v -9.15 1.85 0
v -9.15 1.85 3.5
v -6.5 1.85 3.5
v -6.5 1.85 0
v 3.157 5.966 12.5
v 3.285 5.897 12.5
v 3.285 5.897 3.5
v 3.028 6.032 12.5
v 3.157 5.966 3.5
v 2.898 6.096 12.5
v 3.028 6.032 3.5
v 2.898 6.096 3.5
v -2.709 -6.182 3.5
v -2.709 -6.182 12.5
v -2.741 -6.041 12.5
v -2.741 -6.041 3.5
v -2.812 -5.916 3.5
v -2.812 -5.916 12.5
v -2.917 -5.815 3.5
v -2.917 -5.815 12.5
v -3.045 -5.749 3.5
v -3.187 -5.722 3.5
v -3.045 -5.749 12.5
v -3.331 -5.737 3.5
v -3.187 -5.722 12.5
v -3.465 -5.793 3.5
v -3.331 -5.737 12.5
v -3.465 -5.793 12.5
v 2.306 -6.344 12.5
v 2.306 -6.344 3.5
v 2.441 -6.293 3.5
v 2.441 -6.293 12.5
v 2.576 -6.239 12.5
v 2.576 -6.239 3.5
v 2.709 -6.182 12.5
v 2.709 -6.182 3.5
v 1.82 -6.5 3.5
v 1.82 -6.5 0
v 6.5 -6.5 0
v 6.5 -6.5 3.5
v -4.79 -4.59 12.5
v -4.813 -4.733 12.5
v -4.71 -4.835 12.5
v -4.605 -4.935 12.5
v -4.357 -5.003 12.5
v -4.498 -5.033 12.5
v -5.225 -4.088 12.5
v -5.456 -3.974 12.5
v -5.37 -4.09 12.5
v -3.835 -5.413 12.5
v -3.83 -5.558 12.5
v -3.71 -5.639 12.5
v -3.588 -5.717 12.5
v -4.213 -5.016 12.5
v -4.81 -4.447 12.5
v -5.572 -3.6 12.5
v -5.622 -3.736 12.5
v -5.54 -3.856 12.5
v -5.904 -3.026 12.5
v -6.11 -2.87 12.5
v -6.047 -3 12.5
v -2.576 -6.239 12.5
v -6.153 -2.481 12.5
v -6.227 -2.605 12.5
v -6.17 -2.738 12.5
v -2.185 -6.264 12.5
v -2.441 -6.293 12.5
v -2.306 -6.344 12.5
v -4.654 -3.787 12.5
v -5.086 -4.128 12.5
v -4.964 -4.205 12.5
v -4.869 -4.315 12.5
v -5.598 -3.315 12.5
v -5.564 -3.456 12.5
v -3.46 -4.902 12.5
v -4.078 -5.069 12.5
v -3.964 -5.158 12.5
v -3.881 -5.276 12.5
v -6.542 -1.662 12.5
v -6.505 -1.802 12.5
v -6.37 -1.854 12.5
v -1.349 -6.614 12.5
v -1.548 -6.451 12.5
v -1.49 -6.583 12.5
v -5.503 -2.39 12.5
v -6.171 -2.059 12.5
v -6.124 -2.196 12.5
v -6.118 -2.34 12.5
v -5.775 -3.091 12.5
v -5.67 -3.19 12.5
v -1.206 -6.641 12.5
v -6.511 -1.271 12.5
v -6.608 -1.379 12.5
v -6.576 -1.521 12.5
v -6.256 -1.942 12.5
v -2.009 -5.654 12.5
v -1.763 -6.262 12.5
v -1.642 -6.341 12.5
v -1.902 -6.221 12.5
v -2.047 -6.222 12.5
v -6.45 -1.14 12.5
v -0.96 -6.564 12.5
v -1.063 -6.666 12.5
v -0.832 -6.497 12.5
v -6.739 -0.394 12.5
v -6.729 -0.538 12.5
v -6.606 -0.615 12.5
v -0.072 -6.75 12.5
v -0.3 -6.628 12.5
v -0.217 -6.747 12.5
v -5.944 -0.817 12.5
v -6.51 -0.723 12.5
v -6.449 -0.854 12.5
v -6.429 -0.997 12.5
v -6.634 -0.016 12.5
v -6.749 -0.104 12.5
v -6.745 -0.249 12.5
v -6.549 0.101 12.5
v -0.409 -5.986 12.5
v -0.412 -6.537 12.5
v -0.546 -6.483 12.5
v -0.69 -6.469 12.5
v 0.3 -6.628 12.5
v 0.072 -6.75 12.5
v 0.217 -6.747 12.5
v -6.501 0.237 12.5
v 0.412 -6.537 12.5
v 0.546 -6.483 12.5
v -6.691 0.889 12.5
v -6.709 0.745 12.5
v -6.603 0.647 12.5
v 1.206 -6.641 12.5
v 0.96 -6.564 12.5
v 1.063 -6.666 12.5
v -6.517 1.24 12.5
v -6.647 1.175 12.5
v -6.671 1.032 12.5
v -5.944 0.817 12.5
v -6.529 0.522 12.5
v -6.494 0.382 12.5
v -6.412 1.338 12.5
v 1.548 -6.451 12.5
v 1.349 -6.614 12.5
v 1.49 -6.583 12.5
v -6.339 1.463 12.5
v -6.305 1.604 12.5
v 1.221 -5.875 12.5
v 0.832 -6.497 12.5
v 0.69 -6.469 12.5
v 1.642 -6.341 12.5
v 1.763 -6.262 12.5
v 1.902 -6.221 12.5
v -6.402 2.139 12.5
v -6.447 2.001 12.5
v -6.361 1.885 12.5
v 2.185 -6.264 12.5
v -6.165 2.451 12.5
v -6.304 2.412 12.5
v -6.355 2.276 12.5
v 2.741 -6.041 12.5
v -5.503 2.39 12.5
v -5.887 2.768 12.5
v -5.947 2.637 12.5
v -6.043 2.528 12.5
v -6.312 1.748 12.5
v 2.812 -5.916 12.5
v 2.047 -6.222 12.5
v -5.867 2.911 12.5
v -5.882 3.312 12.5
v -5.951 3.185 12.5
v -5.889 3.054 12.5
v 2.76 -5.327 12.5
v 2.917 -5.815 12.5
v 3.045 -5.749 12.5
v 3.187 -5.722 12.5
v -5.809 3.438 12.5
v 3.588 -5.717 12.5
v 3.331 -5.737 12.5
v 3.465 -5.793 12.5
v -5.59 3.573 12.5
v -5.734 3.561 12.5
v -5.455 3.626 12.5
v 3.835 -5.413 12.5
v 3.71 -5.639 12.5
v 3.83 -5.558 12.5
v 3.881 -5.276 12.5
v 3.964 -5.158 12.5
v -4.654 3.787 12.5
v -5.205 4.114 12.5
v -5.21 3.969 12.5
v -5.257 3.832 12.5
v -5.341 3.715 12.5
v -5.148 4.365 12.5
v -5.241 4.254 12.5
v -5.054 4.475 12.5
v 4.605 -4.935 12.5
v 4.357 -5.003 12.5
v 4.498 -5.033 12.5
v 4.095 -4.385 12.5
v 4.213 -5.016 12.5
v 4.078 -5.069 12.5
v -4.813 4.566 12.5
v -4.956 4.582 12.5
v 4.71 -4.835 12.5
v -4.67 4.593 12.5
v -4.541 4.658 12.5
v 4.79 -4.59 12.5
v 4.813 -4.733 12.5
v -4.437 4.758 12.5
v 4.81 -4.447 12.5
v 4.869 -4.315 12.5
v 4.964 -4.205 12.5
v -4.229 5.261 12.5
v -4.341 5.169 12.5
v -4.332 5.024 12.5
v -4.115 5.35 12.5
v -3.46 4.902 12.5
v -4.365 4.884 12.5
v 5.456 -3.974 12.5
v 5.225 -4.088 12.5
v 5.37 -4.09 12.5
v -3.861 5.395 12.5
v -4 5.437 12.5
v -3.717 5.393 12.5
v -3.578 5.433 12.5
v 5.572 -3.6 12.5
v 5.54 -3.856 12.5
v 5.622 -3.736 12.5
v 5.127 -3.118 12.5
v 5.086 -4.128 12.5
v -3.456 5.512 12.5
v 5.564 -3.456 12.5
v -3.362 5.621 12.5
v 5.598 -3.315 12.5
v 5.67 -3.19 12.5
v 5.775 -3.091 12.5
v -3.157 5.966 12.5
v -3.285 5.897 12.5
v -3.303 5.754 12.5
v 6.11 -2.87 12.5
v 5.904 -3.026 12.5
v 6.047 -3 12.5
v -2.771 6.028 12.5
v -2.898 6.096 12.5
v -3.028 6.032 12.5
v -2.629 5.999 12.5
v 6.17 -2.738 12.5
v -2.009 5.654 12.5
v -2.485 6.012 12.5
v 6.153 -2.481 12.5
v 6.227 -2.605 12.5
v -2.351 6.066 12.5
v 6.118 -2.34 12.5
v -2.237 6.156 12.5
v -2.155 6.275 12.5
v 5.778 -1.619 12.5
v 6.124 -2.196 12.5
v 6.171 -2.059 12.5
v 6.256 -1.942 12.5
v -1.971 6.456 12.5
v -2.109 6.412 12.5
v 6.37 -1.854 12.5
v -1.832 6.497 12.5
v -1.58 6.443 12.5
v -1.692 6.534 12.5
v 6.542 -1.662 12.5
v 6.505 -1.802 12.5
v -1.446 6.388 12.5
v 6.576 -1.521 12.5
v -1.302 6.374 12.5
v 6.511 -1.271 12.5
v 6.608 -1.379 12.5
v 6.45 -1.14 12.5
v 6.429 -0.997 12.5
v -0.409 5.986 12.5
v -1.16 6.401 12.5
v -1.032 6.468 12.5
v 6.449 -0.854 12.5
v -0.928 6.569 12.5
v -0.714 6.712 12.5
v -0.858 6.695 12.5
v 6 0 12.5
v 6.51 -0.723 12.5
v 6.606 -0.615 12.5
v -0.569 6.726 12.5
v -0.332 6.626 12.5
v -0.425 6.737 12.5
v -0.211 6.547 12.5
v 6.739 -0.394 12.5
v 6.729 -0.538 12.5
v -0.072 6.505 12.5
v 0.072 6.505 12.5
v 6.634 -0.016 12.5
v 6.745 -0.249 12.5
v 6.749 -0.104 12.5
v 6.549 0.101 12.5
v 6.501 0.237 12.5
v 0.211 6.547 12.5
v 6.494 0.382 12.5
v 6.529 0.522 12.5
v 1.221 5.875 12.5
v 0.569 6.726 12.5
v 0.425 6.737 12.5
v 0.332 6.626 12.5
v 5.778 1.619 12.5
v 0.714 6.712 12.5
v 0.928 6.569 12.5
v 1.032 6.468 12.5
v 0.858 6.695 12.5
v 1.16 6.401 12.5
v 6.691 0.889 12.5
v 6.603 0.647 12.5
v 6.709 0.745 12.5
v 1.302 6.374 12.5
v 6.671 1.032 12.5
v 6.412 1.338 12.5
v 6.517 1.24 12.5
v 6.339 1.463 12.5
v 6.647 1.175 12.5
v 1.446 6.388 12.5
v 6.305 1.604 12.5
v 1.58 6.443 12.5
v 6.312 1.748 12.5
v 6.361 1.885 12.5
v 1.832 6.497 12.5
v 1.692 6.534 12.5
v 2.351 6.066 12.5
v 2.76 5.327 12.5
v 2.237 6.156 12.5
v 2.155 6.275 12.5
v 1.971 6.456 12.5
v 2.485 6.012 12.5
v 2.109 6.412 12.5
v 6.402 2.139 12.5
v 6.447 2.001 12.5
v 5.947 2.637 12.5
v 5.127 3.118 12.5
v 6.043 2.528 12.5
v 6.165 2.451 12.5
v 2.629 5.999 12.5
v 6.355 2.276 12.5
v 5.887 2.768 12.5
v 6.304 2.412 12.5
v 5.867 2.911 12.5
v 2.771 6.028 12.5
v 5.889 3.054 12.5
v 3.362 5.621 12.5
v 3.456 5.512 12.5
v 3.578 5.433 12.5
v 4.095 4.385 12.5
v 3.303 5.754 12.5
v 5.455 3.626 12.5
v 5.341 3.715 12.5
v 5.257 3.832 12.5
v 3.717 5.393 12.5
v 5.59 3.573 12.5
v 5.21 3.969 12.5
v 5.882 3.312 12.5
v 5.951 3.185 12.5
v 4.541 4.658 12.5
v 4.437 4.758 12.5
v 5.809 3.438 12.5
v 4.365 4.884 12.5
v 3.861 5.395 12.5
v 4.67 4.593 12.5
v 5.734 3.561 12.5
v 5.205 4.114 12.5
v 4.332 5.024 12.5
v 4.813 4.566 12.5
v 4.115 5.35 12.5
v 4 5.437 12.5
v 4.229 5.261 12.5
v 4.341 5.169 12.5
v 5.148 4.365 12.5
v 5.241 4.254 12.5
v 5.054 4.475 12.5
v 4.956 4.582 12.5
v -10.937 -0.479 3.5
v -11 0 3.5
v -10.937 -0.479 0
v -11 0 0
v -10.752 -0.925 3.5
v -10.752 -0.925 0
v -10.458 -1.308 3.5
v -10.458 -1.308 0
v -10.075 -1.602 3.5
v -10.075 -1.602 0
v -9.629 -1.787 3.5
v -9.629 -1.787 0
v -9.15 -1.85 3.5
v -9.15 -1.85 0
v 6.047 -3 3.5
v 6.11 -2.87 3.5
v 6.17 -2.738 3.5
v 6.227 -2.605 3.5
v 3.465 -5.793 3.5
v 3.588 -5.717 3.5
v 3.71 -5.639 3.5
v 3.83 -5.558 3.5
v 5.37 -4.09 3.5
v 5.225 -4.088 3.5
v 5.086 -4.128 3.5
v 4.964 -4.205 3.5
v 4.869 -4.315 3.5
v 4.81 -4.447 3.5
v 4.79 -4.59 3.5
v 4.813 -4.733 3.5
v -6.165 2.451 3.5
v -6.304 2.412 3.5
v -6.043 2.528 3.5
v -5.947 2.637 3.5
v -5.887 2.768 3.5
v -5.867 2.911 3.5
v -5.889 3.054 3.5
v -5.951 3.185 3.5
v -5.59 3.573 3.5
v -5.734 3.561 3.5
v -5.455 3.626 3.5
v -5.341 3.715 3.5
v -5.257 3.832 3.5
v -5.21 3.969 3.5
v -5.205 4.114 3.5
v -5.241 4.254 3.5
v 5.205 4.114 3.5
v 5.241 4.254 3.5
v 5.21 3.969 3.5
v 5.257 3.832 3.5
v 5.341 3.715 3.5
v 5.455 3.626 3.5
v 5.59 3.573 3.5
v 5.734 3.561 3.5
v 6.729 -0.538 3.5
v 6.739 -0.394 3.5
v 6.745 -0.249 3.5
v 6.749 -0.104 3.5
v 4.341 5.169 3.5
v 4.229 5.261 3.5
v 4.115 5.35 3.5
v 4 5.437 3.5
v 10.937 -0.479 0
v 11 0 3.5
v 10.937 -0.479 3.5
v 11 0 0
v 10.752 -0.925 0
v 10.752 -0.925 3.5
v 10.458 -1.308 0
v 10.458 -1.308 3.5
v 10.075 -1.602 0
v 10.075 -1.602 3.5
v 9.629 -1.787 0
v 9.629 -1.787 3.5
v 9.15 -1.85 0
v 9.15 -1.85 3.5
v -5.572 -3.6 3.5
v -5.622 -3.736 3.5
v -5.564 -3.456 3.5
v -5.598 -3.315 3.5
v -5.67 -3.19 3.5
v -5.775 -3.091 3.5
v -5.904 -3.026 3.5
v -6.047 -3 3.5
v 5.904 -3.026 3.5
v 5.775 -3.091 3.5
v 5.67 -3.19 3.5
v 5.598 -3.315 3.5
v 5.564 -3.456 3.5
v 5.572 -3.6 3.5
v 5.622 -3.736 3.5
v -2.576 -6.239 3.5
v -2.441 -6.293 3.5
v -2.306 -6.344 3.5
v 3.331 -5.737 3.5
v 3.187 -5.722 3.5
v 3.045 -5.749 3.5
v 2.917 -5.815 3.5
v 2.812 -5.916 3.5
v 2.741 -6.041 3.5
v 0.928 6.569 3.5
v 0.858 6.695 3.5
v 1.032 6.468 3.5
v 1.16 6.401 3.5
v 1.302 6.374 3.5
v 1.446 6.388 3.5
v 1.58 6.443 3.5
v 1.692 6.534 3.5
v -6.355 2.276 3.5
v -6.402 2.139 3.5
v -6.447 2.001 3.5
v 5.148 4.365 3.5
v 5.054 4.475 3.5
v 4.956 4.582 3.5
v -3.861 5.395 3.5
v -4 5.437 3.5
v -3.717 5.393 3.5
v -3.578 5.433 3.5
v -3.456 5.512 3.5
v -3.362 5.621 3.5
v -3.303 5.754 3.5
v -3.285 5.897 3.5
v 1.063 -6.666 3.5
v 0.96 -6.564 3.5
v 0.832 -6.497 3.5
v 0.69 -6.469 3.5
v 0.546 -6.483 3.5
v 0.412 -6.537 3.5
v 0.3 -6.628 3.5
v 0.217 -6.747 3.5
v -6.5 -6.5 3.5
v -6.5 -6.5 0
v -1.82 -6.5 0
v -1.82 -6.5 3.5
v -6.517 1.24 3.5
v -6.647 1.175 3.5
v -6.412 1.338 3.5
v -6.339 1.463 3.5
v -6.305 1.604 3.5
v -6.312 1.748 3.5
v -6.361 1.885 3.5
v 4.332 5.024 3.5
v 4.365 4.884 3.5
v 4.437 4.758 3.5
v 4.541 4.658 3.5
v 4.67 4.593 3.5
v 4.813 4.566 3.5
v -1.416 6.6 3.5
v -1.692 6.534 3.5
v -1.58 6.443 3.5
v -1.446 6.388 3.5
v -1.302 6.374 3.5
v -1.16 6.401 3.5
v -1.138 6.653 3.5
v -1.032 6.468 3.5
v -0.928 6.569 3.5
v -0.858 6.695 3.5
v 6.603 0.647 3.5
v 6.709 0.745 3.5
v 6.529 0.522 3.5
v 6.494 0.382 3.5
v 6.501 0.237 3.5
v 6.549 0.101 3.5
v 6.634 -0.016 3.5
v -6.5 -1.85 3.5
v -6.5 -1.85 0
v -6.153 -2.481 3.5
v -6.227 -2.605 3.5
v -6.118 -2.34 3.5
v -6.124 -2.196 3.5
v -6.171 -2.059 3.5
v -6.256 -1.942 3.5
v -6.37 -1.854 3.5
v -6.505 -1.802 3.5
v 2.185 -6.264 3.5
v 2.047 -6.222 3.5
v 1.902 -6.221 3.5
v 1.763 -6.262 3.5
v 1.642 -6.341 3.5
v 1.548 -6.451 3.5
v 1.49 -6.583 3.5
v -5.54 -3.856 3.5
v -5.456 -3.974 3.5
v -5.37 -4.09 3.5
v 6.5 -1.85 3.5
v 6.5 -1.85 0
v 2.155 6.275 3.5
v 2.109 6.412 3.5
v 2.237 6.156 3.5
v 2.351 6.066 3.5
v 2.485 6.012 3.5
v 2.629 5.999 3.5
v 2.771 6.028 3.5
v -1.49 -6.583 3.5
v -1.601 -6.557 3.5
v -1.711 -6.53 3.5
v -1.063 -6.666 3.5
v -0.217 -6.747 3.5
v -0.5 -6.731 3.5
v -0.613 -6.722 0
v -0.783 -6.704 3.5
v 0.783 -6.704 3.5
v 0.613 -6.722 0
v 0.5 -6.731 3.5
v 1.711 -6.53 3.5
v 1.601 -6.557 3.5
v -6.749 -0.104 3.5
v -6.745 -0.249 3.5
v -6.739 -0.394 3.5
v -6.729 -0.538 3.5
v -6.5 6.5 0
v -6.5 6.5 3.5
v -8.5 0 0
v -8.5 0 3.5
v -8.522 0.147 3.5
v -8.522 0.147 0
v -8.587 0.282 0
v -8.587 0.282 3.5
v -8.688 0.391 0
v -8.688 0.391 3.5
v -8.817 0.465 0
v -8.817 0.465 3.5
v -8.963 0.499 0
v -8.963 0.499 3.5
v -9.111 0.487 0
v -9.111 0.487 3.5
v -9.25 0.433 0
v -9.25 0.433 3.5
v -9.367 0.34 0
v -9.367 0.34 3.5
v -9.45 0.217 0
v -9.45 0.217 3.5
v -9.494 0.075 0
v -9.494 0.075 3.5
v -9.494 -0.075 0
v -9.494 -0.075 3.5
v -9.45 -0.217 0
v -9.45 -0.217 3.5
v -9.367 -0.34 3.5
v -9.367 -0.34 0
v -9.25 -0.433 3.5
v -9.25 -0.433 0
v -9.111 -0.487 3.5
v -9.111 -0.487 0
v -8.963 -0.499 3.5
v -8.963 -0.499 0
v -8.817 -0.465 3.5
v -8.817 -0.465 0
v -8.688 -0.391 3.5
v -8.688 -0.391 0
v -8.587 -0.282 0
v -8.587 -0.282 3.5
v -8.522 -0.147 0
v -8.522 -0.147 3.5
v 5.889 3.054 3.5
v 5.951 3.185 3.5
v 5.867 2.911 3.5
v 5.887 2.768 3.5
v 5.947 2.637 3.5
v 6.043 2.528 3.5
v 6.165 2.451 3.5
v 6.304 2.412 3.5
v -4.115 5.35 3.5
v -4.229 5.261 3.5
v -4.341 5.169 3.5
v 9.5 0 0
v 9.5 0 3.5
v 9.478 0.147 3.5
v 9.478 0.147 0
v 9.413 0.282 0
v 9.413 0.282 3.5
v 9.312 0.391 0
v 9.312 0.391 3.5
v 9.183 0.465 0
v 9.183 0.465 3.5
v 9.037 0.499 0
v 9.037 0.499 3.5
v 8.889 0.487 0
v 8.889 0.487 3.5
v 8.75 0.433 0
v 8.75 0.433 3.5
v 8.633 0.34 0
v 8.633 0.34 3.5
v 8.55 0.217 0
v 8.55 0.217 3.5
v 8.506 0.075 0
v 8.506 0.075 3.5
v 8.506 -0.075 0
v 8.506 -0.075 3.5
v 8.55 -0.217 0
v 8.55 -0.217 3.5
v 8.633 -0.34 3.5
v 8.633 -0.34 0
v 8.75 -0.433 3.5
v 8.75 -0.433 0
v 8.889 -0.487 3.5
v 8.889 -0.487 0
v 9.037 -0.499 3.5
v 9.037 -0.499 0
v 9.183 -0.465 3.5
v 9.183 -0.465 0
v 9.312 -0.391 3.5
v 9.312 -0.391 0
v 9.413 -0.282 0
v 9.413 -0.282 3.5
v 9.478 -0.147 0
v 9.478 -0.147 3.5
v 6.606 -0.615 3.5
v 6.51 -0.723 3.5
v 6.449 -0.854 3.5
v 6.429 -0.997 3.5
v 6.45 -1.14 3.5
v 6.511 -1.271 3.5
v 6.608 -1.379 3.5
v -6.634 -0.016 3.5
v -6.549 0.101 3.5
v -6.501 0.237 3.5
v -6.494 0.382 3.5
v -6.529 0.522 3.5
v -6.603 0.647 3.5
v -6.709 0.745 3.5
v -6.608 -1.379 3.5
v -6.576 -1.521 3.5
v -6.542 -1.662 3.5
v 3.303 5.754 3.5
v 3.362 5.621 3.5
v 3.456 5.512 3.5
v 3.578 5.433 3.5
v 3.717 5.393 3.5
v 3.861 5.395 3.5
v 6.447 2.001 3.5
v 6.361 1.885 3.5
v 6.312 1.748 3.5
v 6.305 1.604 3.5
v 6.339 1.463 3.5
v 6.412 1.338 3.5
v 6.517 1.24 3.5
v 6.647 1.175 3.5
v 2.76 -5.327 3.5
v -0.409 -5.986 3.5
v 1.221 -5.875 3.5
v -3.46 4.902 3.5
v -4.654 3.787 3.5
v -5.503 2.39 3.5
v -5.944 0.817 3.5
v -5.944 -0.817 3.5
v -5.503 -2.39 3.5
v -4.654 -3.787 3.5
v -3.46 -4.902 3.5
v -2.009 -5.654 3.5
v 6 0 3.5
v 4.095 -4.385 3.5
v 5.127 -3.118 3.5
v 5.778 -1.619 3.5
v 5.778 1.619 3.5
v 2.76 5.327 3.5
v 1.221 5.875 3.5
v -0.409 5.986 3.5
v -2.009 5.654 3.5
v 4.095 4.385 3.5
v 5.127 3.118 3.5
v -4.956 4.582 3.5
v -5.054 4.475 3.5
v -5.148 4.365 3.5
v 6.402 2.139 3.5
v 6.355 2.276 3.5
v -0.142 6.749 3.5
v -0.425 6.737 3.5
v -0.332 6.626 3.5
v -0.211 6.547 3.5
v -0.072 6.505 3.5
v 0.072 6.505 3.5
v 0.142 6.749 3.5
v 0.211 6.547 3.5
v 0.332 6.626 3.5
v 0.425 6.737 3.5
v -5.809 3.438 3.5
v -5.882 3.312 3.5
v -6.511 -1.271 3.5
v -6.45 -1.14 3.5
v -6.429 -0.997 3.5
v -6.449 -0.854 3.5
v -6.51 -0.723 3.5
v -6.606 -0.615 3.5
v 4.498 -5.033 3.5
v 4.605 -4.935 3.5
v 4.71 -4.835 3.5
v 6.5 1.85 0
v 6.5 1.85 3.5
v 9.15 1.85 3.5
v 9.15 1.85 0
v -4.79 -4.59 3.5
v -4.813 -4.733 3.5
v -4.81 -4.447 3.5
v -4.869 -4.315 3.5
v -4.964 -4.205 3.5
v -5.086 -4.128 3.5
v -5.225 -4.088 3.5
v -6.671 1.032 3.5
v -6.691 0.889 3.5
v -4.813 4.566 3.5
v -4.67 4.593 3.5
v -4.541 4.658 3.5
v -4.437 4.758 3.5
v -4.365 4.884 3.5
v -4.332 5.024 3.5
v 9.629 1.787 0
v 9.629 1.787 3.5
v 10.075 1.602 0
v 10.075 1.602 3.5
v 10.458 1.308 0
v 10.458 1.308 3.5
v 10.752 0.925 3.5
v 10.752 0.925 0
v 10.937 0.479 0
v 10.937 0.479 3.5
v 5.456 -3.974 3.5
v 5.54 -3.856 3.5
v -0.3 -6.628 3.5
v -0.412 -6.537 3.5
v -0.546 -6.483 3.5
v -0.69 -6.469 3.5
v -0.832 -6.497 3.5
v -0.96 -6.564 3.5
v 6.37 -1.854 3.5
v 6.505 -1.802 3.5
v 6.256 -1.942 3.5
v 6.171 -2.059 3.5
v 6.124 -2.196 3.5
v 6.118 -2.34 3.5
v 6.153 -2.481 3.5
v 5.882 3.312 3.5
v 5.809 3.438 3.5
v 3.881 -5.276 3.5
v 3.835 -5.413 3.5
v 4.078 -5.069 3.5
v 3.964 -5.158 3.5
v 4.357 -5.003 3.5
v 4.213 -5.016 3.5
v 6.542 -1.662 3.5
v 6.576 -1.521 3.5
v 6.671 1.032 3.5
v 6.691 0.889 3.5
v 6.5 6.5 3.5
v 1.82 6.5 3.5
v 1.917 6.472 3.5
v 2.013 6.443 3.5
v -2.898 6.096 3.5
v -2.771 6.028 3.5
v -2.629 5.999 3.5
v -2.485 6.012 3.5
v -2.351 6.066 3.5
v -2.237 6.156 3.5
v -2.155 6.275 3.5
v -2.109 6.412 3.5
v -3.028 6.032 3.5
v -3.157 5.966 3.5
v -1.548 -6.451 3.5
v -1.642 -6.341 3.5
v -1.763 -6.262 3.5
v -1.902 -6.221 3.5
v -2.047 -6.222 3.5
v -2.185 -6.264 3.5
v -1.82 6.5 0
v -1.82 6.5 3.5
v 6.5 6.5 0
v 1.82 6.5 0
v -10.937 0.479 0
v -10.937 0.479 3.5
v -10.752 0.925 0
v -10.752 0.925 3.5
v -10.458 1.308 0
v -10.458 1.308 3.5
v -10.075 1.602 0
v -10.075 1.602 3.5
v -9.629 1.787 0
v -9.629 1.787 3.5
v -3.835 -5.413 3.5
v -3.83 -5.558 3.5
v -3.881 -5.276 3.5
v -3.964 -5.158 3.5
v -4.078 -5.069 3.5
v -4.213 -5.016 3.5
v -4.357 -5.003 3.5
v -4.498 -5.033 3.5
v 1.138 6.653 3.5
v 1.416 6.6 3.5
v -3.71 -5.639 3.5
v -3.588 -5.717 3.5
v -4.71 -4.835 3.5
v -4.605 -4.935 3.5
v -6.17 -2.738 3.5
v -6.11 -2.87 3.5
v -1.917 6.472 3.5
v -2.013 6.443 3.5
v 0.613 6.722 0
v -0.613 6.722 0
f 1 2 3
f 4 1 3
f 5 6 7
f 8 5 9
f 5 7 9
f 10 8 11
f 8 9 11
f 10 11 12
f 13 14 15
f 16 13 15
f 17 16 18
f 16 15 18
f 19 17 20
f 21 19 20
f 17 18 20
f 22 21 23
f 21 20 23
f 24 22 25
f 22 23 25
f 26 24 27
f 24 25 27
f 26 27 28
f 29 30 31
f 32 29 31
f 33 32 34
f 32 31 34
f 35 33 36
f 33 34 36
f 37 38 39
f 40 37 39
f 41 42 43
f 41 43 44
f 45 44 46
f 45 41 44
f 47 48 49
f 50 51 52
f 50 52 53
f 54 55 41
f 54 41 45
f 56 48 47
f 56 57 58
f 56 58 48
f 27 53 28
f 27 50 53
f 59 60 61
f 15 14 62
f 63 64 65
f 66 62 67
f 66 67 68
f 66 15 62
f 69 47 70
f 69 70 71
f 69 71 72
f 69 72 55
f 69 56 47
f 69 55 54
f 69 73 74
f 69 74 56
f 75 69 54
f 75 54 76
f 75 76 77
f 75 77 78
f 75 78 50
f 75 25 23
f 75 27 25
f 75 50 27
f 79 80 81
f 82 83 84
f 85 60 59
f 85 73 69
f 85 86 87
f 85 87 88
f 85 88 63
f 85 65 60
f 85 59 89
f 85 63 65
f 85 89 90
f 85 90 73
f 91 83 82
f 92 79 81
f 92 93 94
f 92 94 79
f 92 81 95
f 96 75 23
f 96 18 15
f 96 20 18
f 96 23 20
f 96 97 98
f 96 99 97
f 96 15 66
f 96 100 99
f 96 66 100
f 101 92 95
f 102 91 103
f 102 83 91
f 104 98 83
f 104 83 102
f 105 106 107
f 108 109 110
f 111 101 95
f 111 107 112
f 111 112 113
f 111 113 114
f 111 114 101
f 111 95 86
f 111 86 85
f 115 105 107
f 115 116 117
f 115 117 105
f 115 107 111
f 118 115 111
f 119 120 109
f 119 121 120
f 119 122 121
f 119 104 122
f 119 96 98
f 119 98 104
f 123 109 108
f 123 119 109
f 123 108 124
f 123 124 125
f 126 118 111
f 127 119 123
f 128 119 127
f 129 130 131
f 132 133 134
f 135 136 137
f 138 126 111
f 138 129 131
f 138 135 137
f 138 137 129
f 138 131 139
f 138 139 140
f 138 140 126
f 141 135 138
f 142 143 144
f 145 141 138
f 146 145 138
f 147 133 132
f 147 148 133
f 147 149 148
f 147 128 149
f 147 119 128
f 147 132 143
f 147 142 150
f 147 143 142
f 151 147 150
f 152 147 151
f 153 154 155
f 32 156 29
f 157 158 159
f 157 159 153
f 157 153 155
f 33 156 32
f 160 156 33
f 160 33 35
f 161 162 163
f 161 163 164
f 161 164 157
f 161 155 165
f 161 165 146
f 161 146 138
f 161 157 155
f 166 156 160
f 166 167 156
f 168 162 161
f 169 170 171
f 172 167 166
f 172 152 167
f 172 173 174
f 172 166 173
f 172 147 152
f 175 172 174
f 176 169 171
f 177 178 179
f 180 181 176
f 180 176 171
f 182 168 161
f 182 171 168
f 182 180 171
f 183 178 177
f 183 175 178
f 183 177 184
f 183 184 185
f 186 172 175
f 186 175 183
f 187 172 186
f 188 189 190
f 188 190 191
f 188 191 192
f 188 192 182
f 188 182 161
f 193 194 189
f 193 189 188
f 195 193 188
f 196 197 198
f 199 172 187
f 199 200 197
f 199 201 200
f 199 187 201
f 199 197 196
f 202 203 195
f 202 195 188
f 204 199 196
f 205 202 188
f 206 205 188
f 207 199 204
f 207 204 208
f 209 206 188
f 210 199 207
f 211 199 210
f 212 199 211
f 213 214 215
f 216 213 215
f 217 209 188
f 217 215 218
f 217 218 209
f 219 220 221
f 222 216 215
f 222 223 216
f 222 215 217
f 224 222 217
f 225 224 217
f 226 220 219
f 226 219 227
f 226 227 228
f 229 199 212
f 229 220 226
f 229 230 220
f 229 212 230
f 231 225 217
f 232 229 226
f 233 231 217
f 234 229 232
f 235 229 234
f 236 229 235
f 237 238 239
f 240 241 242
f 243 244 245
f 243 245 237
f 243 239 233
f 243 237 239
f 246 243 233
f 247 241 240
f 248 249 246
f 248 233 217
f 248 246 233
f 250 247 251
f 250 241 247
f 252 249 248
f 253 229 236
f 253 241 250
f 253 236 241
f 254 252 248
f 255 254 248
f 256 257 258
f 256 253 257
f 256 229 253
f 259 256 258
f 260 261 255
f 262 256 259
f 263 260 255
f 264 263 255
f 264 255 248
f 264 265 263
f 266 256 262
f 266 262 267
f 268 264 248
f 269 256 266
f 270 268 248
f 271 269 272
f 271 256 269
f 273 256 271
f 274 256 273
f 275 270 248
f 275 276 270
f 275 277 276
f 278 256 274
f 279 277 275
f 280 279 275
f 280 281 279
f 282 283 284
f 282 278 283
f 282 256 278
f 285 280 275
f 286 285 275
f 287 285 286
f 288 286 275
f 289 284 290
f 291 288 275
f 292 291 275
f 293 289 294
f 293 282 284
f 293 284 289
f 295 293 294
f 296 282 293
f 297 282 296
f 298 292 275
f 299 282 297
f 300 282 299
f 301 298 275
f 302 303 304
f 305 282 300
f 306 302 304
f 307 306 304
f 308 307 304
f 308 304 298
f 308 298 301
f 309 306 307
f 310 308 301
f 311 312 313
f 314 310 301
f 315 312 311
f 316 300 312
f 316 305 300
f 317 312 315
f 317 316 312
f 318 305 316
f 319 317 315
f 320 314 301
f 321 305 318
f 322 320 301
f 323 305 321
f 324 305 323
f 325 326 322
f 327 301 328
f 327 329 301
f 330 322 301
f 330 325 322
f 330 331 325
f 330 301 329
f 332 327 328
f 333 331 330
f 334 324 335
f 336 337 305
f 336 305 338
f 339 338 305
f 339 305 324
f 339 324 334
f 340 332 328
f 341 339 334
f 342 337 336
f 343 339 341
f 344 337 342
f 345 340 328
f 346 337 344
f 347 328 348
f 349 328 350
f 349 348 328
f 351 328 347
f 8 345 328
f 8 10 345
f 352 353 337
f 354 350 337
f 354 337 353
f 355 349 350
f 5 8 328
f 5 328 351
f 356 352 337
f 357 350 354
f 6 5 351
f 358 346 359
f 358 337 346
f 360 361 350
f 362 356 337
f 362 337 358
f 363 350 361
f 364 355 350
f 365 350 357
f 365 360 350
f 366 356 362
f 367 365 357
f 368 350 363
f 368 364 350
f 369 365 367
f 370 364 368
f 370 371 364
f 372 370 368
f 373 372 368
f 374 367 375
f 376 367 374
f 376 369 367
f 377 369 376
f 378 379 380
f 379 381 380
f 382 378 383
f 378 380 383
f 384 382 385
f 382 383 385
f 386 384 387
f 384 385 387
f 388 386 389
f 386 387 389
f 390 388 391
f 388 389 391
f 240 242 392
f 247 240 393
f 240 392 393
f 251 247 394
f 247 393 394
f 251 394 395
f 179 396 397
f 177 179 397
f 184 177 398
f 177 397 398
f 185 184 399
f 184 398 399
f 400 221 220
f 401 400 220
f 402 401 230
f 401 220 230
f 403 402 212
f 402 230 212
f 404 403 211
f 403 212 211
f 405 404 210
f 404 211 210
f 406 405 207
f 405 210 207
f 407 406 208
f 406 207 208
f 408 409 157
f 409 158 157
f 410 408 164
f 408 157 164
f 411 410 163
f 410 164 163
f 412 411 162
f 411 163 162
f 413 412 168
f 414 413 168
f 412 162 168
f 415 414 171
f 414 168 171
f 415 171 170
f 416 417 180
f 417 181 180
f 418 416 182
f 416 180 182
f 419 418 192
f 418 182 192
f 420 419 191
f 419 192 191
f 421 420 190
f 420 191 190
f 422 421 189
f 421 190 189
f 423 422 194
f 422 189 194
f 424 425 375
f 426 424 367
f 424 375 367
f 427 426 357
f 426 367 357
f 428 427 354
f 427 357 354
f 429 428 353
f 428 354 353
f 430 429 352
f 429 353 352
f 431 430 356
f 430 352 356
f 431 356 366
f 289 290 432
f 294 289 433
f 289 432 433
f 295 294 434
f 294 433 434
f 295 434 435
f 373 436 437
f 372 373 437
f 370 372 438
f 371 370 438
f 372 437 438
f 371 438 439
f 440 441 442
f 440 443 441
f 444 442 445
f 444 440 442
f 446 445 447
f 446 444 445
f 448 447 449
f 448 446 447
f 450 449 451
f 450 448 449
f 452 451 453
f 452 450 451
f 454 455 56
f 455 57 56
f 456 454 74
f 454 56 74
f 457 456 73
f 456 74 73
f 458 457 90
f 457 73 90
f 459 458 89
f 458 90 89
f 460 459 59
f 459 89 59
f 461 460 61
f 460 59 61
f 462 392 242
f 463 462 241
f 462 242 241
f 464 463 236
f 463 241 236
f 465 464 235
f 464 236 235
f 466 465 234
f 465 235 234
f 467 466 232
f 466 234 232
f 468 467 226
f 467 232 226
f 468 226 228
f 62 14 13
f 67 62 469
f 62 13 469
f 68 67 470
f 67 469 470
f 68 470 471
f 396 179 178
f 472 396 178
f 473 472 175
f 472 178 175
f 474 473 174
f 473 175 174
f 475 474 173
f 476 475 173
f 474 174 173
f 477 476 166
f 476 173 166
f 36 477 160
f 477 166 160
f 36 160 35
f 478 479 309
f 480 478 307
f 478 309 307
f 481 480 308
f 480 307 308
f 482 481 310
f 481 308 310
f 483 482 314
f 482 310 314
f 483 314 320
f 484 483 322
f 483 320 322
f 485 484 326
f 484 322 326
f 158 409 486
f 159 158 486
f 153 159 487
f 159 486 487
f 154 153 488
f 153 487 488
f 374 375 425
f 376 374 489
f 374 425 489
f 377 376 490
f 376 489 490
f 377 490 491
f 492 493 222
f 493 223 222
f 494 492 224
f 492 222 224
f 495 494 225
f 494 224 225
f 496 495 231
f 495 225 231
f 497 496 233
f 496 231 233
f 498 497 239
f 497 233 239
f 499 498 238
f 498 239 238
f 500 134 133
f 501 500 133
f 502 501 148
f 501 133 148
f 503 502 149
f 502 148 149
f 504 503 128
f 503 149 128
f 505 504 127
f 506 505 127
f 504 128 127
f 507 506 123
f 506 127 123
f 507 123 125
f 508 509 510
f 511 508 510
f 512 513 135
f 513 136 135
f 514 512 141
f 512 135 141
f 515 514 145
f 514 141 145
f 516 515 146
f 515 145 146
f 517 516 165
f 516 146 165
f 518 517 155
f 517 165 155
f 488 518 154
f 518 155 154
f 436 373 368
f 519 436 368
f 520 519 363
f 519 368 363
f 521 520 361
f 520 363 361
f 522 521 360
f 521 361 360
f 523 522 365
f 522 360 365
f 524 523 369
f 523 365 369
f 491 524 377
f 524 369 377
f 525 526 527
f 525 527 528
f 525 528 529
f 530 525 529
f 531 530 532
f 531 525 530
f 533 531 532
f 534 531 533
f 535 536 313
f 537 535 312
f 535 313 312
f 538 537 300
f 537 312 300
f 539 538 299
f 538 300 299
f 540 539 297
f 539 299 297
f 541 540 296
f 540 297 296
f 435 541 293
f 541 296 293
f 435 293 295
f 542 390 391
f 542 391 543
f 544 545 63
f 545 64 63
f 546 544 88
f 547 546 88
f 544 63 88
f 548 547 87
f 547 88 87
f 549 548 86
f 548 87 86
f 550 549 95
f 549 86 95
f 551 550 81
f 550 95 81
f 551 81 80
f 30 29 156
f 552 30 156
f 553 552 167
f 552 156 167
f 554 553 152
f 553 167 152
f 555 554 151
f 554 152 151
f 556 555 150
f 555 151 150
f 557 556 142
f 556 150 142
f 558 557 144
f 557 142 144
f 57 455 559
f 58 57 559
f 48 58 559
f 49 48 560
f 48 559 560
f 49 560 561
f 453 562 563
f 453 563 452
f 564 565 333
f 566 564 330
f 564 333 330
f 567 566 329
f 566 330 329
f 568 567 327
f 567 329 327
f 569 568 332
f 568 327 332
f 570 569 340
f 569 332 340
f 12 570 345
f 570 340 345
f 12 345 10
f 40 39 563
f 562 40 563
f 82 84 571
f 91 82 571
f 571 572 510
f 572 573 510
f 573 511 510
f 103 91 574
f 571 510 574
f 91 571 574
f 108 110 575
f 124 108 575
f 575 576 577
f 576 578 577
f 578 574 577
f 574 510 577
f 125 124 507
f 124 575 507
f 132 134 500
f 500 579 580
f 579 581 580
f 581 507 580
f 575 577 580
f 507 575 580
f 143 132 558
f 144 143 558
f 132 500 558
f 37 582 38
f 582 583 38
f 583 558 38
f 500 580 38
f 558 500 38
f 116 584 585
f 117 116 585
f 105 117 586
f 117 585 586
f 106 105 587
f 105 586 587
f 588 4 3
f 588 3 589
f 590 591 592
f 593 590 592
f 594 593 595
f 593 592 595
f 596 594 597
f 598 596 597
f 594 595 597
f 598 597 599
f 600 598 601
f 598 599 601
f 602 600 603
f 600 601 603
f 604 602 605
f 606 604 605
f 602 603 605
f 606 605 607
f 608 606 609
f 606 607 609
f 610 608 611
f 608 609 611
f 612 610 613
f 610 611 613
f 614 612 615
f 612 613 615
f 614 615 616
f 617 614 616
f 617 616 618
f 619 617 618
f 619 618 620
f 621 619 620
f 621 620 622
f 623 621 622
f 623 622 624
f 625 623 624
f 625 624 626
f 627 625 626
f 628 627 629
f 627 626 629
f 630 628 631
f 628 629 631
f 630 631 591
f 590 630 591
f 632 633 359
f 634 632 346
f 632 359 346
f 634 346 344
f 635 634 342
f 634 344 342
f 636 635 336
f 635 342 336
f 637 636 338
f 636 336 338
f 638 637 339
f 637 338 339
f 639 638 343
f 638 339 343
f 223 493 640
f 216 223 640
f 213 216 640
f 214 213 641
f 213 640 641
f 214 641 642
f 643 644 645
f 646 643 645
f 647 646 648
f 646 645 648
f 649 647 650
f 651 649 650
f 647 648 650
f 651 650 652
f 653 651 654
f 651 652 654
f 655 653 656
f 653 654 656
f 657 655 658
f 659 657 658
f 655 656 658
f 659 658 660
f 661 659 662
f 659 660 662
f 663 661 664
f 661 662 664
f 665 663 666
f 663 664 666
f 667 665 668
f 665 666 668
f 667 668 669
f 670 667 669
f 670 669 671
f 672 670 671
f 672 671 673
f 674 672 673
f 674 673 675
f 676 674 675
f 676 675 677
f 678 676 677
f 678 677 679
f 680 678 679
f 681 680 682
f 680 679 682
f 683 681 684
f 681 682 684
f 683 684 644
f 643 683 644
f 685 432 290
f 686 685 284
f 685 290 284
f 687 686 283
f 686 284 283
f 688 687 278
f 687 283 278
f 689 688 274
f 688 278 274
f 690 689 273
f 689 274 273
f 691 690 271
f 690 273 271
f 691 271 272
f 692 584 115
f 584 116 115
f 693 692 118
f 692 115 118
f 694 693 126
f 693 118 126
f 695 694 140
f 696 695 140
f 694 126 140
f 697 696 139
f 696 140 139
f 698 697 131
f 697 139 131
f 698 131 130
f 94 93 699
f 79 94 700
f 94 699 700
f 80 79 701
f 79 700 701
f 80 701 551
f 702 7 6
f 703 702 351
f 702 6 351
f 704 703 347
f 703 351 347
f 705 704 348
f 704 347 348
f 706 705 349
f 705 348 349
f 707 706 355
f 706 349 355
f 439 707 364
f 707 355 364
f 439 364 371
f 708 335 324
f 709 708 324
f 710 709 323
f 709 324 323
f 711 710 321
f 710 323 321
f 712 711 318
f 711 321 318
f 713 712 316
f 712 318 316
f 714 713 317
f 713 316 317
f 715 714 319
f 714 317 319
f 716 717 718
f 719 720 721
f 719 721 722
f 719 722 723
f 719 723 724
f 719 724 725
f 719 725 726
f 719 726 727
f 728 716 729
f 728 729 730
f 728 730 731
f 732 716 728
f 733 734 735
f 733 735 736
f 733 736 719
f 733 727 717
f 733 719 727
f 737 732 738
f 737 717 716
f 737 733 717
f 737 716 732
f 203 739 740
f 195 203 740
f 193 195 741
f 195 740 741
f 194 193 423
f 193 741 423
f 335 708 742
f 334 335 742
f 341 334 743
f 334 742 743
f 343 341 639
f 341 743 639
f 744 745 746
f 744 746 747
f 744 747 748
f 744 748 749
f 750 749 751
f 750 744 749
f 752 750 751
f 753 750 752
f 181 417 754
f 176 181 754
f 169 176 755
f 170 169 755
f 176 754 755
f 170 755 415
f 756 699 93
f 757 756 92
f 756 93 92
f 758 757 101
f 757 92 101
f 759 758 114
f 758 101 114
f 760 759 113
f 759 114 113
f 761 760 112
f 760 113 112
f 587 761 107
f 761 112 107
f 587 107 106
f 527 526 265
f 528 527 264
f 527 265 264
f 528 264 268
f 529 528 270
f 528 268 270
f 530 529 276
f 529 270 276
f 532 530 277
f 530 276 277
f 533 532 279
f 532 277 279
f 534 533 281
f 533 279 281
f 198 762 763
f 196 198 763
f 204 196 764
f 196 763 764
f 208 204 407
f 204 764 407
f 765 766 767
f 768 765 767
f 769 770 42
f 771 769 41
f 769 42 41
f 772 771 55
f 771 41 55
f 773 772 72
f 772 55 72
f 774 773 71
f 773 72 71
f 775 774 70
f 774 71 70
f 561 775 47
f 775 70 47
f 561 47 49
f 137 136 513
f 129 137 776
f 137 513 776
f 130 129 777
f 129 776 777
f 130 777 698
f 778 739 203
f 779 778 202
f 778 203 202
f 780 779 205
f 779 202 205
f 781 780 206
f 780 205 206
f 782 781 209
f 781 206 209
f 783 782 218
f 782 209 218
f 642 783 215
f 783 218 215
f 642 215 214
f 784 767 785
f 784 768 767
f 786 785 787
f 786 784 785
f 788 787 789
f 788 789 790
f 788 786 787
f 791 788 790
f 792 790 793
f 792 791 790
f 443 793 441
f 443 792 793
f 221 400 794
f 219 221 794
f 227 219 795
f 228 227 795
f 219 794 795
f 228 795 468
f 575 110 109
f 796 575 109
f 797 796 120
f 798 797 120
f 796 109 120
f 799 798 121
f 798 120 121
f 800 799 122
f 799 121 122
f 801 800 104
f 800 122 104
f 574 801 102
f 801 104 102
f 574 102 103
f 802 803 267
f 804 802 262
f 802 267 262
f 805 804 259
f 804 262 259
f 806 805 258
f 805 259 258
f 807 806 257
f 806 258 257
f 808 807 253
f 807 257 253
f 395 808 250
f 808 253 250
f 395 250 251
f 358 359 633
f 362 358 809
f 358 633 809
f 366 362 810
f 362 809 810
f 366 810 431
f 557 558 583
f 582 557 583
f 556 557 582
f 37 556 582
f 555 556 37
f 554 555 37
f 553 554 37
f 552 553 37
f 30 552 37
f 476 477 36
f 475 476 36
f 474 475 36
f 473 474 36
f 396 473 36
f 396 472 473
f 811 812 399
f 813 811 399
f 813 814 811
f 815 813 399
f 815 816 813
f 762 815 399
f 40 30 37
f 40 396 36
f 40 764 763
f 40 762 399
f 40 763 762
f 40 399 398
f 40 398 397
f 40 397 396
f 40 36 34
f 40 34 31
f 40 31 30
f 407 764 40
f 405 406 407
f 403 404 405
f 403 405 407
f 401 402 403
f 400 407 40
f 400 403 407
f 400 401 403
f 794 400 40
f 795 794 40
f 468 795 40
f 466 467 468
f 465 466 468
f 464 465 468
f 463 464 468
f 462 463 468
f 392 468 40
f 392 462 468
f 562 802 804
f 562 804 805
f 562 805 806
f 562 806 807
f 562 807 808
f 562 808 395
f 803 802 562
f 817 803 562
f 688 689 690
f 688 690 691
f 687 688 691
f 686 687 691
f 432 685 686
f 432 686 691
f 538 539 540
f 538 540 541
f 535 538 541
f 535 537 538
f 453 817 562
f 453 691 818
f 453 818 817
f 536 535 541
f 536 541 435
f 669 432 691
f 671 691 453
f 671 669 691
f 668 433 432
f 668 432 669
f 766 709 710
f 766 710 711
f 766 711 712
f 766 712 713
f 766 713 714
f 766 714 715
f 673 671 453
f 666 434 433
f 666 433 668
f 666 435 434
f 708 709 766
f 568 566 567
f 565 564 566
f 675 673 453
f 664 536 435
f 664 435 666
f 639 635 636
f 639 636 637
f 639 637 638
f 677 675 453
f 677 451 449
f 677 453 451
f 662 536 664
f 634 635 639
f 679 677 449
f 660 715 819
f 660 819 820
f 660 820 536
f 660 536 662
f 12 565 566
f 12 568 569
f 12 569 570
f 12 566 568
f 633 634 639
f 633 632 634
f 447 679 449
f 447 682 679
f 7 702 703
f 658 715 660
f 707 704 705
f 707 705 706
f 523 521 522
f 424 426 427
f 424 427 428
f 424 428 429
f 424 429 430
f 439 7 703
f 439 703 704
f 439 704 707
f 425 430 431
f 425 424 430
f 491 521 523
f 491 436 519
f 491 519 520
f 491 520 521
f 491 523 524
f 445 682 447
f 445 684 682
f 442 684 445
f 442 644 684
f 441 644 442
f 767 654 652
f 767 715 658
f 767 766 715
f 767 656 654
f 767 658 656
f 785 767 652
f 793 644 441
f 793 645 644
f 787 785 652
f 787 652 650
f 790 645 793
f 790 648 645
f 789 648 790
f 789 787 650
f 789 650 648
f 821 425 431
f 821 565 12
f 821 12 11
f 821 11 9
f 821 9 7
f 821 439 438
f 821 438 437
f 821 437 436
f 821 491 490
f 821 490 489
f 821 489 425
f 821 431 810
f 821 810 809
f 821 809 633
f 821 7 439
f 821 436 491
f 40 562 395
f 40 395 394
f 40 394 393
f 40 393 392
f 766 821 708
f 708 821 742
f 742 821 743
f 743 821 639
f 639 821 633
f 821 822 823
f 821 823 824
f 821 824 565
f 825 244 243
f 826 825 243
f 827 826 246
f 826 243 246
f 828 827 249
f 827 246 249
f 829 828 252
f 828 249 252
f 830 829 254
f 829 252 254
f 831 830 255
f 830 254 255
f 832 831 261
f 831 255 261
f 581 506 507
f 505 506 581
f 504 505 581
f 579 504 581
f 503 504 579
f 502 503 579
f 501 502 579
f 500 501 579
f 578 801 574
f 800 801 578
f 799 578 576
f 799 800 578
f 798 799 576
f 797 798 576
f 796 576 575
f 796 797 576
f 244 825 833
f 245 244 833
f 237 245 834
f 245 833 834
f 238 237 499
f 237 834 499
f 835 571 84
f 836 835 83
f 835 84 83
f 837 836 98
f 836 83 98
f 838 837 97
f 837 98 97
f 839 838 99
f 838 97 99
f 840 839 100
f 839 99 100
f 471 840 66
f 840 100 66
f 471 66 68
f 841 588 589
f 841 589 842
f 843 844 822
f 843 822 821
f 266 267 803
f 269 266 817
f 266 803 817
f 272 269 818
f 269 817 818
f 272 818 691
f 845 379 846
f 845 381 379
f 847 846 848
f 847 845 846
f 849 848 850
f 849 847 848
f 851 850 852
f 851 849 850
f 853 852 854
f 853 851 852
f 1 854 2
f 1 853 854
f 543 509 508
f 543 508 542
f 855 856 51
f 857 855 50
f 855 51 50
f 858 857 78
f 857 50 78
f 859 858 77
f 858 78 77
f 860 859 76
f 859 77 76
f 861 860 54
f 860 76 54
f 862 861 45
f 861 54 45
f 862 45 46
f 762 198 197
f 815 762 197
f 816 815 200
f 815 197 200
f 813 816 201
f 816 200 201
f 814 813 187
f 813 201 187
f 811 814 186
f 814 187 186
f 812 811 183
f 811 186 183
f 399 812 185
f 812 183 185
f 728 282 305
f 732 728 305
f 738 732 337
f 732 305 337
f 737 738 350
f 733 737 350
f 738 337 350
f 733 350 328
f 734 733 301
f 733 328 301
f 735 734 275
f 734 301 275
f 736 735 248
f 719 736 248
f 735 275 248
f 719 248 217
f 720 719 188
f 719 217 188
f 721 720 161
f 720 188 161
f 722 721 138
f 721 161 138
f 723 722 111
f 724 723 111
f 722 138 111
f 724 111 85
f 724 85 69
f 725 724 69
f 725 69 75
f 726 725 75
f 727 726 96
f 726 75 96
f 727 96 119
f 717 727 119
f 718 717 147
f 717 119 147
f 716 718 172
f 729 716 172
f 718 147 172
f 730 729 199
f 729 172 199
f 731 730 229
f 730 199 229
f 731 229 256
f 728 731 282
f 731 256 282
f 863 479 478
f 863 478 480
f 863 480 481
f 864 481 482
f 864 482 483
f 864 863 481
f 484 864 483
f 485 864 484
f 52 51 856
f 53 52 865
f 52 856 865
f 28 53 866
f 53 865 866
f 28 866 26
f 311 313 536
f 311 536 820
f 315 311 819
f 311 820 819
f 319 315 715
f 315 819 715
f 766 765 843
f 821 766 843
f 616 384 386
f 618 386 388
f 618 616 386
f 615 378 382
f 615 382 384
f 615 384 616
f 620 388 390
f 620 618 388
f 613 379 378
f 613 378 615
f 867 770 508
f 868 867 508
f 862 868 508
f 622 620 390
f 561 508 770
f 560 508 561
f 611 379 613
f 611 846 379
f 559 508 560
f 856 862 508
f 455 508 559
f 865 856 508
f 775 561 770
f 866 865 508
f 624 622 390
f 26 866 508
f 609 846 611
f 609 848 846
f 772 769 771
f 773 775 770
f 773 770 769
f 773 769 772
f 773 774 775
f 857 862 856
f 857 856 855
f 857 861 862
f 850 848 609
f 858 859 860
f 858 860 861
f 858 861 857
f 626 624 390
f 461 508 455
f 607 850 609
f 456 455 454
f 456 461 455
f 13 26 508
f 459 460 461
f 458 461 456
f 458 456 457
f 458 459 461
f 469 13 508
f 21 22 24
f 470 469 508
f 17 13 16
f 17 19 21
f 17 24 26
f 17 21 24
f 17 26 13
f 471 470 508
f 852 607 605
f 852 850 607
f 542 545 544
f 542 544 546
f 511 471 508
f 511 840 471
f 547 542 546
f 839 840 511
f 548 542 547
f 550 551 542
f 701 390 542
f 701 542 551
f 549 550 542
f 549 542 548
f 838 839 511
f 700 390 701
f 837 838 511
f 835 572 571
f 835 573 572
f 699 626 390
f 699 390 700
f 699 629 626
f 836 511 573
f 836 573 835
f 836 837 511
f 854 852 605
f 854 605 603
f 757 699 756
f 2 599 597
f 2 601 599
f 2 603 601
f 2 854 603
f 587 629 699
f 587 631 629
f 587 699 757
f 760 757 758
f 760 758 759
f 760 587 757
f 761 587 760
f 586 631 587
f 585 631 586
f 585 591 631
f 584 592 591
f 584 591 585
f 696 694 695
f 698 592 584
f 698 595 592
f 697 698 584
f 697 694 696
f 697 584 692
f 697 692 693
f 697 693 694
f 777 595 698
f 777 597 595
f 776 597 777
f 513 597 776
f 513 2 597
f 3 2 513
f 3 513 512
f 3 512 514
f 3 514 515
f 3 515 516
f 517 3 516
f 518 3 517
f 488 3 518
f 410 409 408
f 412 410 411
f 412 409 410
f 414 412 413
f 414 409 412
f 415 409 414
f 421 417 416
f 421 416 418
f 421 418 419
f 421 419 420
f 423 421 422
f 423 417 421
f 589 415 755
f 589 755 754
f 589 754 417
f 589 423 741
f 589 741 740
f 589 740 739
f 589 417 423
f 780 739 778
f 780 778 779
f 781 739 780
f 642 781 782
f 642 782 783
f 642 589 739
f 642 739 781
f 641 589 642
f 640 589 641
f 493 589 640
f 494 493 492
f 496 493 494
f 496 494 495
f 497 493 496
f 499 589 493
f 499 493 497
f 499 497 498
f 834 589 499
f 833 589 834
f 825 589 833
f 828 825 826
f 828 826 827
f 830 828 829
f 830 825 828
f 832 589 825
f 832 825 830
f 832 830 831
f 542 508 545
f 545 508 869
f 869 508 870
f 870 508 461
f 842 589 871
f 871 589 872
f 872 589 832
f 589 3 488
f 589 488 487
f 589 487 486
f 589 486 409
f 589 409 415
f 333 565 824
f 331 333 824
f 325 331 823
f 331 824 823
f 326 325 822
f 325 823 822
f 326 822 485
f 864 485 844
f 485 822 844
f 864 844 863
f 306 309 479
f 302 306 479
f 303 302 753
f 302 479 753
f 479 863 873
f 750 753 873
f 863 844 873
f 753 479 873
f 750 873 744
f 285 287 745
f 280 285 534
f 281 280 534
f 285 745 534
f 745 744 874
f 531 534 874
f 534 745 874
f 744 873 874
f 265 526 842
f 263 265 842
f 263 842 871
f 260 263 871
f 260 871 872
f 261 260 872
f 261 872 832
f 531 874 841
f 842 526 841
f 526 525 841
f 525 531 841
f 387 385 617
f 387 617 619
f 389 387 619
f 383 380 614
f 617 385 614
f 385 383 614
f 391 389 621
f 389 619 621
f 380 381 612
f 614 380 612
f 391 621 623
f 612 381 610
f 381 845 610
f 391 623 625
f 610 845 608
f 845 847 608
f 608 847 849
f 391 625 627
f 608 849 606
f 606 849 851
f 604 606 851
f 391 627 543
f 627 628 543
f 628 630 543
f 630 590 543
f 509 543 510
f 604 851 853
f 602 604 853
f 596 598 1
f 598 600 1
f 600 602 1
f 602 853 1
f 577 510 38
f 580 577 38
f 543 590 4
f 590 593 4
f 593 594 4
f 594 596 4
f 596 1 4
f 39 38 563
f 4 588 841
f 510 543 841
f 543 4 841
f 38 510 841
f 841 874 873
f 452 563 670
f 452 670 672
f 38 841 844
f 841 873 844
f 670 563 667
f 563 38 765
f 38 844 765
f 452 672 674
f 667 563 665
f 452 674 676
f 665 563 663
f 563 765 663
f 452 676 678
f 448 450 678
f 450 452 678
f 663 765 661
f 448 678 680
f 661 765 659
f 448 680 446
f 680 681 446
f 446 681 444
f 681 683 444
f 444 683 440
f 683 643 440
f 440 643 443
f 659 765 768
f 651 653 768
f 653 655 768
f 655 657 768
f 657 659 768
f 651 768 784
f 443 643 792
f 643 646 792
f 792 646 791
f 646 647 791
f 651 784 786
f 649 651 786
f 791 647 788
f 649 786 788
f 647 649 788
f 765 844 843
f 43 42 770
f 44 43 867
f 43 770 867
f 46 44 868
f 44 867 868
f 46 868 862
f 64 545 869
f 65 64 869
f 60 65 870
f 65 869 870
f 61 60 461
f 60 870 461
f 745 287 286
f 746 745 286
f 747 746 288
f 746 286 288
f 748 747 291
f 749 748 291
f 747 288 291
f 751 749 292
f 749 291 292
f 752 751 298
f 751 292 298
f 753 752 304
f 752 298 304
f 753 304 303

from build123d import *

# Parameters (mm, degrees)
SKETCH1_W                = 13
SKETCH1_H                = 13
BOSS_EXTRUDE1_DEPTH      = 3.5
SKETCH2_W                = 22
SKETCH2_H                = 3.7
BOSS_EXTRUDE2_DEPTH      = 3.5
FILLET1_R                = 1.85
SKETCH3_R                = 0.5
CUT_EXTRUDE1_DEPTH       = 3.5
BOSS_EXTRUDE3_DEPTH      = 9
BOSS_EXTRUDE3_DEPTH_BACK = 3.5
SKETCH4_R                = 6.75
SKETCH5_R                = 0.5
CUT_EXTRUDE2_DEPTH       = 9
SKETCH6_R                = 6
CUT_EXTRUDE3_DEPTH       = 9


with BuildPart() as part:
    # Sketch1 → Boss-Extrude1 (new body)
    with BuildSketch(Plane.XY):
        Rectangle(SKETCH1_W, SKETCH1_H)
    extrude(amount=BOSS_EXTRUDE1_DEPTH)

    # Sketch2 → Boss-Extrude2 (add)
    with BuildSketch(Plane.XY.offset(3.5)):
        Rectangle(SKETCH2_W, SKETCH2_H)
    extrude(amount=-BOSS_EXTRUDE2_DEPTH)

    # Fillet1
    fillet1_edges = [part.edges().sort_by_distance(p)[0] for p in [
        (11, -1.85, 1.75),
        (11, 1.85, 1.75),
        (-11, -1.85, 1.75),
        (-11, 1.85, 1.75),
    ]]
    fillet(fillet1_edges, radius=FILLET1_R - 0.0001)  # a hair under: the kernel refuses the full size

    # Sketch3 → Cut-Extrude1 (cut)
    with BuildSketch(Plane.XY.offset(3.5)):
        with Locations((-9, 0)):
            Circle(SKETCH3_R)
        with Locations((9, 0)):
            Circle(SKETCH3_R)
    extrude(amount=-CUT_EXTRUDE1_DEPTH, mode=Mode.SUBTRACT)

    # Sketch4 → Boss-Extrude3 (add, two sides: drawn at the far end of the back side and taken through both)
    with BuildSketch(Plane.XY.offset(3.5).offset(-BOSS_EXTRUDE3_DEPTH_BACK)):
        Circle(SKETCH4_R)
    extrude(amount=BOSS_EXTRUDE3_DEPTH + BOSS_EXTRUDE3_DEPTH_BACK)

    # Sketch5 → Cut-Extrude2 (cut)
    with BuildSketch(Plane.XY.offset(12.5)):
        with Locations((0, 7)):
            Circle(SKETCH5_R)
        with Locations((1.324758711, 6.873500881)):
            Circle(SKETCH5_R)
        with Locations((2.60163719, 6.498575531)):
            Circle(SKETCH5_R)
        with Locations((3.784485722, 5.88877473)):
            Circle(SKETCH5_R)
        with Locations((4.83055308, 5.066138267)):
            Circle(SKETCH5_R)
        with Locations((5.702031664, 4.060398367)):
            Circle(SKETCH5_R)
        with Locations((6.367423967, 2.907905091)):
            Circle(SKETCH5_R)
        with Locations((6.802680978, 1.650312549)):
            Circle(SKETCH5_R)
        with Locations((6.992071374, 0.333073411)):
            Circle(SKETCH5_R)
        with Locations((6.928750093, -0.996203868)):
            Circle(SKETCH5_R)
        with Locations((6.615005731, -2.289475743)):
            Circle(SKETCH5_R)
        with Locations((6.062177826, -3.5)):
            Circle(SKETCH5_R)
        with Locations((5.29024702, -4.584025138)):
            Circle(SKETCH5_R)
        with Locations((4.327112904, -5.502371663)):
            Circle(SKETCH5_R)
        with Locations((3.207585652, -6.221848141)):
            Circle(SKETCH5_R)
        with Locations((1.972127898, -6.716450815)):
            Circle(SKETCH5_R)
        with Locations((0.665392303, -6.968303458)):
            Circle(SKETCH5_R)
        with Locations((-0.665392303, -6.968303458)):
            Circle(SKETCH5_R)
        with Locations((-1.972127898, -6.716450815)):
            Circle(SKETCH5_R)
        with Locations((-3.207585652, -6.221848141)):
            Circle(SKETCH5_R)
        with Locations((-4.327112904, -5.502371663)):
            Circle(SKETCH5_R)
        with Locations((-5.29024702, -4.584025138)):
            Circle(SKETCH5_R)
        with Locations((-6.062177826, -3.5)):
            Circle(SKETCH5_R)
        with Locations((-6.615005731, -2.289475743)):
            Circle(SKETCH5_R)
        with Locations((-6.928750093, -0.996203868)):
            Circle(SKETCH5_R)
        with Locations((-6.992071374, 0.333073411)):
            Circle(SKETCH5_R)
        with Locations((-6.802680978, 1.650312549)):
            Circle(SKETCH5_R)
        with Locations((-6.367423967, 2.907905091)):
            Circle(SKETCH5_R)
        with Locations((-5.702031664, 4.060398367)):
            Circle(SKETCH5_R)
        with Locations((-4.83055308, 5.066138267)):
            Circle(SKETCH5_R)
        with Locations((-3.784485722, 5.88877473)):
            Circle(SKETCH5_R)
        with Locations((-2.60163719, 6.498575531)):
            Circle(SKETCH5_R)
        with Locations((-1.324758711, 6.873500881)):
            Circle(SKETCH5_R)
    extrude(amount=-CUT_EXTRUDE2_DEPTH, mode=Mode.SUBTRACT)

    # Sketch6 → Cut-Extrude3 (cut)
    with BuildSketch(Plane.XY.offset(12.5)):
        Circle(SKETCH6_R)
    extrude(amount=-CUT_EXTRUDE3_DEPTH, mode=Mode.SUBTRACT)


solid = part.part
